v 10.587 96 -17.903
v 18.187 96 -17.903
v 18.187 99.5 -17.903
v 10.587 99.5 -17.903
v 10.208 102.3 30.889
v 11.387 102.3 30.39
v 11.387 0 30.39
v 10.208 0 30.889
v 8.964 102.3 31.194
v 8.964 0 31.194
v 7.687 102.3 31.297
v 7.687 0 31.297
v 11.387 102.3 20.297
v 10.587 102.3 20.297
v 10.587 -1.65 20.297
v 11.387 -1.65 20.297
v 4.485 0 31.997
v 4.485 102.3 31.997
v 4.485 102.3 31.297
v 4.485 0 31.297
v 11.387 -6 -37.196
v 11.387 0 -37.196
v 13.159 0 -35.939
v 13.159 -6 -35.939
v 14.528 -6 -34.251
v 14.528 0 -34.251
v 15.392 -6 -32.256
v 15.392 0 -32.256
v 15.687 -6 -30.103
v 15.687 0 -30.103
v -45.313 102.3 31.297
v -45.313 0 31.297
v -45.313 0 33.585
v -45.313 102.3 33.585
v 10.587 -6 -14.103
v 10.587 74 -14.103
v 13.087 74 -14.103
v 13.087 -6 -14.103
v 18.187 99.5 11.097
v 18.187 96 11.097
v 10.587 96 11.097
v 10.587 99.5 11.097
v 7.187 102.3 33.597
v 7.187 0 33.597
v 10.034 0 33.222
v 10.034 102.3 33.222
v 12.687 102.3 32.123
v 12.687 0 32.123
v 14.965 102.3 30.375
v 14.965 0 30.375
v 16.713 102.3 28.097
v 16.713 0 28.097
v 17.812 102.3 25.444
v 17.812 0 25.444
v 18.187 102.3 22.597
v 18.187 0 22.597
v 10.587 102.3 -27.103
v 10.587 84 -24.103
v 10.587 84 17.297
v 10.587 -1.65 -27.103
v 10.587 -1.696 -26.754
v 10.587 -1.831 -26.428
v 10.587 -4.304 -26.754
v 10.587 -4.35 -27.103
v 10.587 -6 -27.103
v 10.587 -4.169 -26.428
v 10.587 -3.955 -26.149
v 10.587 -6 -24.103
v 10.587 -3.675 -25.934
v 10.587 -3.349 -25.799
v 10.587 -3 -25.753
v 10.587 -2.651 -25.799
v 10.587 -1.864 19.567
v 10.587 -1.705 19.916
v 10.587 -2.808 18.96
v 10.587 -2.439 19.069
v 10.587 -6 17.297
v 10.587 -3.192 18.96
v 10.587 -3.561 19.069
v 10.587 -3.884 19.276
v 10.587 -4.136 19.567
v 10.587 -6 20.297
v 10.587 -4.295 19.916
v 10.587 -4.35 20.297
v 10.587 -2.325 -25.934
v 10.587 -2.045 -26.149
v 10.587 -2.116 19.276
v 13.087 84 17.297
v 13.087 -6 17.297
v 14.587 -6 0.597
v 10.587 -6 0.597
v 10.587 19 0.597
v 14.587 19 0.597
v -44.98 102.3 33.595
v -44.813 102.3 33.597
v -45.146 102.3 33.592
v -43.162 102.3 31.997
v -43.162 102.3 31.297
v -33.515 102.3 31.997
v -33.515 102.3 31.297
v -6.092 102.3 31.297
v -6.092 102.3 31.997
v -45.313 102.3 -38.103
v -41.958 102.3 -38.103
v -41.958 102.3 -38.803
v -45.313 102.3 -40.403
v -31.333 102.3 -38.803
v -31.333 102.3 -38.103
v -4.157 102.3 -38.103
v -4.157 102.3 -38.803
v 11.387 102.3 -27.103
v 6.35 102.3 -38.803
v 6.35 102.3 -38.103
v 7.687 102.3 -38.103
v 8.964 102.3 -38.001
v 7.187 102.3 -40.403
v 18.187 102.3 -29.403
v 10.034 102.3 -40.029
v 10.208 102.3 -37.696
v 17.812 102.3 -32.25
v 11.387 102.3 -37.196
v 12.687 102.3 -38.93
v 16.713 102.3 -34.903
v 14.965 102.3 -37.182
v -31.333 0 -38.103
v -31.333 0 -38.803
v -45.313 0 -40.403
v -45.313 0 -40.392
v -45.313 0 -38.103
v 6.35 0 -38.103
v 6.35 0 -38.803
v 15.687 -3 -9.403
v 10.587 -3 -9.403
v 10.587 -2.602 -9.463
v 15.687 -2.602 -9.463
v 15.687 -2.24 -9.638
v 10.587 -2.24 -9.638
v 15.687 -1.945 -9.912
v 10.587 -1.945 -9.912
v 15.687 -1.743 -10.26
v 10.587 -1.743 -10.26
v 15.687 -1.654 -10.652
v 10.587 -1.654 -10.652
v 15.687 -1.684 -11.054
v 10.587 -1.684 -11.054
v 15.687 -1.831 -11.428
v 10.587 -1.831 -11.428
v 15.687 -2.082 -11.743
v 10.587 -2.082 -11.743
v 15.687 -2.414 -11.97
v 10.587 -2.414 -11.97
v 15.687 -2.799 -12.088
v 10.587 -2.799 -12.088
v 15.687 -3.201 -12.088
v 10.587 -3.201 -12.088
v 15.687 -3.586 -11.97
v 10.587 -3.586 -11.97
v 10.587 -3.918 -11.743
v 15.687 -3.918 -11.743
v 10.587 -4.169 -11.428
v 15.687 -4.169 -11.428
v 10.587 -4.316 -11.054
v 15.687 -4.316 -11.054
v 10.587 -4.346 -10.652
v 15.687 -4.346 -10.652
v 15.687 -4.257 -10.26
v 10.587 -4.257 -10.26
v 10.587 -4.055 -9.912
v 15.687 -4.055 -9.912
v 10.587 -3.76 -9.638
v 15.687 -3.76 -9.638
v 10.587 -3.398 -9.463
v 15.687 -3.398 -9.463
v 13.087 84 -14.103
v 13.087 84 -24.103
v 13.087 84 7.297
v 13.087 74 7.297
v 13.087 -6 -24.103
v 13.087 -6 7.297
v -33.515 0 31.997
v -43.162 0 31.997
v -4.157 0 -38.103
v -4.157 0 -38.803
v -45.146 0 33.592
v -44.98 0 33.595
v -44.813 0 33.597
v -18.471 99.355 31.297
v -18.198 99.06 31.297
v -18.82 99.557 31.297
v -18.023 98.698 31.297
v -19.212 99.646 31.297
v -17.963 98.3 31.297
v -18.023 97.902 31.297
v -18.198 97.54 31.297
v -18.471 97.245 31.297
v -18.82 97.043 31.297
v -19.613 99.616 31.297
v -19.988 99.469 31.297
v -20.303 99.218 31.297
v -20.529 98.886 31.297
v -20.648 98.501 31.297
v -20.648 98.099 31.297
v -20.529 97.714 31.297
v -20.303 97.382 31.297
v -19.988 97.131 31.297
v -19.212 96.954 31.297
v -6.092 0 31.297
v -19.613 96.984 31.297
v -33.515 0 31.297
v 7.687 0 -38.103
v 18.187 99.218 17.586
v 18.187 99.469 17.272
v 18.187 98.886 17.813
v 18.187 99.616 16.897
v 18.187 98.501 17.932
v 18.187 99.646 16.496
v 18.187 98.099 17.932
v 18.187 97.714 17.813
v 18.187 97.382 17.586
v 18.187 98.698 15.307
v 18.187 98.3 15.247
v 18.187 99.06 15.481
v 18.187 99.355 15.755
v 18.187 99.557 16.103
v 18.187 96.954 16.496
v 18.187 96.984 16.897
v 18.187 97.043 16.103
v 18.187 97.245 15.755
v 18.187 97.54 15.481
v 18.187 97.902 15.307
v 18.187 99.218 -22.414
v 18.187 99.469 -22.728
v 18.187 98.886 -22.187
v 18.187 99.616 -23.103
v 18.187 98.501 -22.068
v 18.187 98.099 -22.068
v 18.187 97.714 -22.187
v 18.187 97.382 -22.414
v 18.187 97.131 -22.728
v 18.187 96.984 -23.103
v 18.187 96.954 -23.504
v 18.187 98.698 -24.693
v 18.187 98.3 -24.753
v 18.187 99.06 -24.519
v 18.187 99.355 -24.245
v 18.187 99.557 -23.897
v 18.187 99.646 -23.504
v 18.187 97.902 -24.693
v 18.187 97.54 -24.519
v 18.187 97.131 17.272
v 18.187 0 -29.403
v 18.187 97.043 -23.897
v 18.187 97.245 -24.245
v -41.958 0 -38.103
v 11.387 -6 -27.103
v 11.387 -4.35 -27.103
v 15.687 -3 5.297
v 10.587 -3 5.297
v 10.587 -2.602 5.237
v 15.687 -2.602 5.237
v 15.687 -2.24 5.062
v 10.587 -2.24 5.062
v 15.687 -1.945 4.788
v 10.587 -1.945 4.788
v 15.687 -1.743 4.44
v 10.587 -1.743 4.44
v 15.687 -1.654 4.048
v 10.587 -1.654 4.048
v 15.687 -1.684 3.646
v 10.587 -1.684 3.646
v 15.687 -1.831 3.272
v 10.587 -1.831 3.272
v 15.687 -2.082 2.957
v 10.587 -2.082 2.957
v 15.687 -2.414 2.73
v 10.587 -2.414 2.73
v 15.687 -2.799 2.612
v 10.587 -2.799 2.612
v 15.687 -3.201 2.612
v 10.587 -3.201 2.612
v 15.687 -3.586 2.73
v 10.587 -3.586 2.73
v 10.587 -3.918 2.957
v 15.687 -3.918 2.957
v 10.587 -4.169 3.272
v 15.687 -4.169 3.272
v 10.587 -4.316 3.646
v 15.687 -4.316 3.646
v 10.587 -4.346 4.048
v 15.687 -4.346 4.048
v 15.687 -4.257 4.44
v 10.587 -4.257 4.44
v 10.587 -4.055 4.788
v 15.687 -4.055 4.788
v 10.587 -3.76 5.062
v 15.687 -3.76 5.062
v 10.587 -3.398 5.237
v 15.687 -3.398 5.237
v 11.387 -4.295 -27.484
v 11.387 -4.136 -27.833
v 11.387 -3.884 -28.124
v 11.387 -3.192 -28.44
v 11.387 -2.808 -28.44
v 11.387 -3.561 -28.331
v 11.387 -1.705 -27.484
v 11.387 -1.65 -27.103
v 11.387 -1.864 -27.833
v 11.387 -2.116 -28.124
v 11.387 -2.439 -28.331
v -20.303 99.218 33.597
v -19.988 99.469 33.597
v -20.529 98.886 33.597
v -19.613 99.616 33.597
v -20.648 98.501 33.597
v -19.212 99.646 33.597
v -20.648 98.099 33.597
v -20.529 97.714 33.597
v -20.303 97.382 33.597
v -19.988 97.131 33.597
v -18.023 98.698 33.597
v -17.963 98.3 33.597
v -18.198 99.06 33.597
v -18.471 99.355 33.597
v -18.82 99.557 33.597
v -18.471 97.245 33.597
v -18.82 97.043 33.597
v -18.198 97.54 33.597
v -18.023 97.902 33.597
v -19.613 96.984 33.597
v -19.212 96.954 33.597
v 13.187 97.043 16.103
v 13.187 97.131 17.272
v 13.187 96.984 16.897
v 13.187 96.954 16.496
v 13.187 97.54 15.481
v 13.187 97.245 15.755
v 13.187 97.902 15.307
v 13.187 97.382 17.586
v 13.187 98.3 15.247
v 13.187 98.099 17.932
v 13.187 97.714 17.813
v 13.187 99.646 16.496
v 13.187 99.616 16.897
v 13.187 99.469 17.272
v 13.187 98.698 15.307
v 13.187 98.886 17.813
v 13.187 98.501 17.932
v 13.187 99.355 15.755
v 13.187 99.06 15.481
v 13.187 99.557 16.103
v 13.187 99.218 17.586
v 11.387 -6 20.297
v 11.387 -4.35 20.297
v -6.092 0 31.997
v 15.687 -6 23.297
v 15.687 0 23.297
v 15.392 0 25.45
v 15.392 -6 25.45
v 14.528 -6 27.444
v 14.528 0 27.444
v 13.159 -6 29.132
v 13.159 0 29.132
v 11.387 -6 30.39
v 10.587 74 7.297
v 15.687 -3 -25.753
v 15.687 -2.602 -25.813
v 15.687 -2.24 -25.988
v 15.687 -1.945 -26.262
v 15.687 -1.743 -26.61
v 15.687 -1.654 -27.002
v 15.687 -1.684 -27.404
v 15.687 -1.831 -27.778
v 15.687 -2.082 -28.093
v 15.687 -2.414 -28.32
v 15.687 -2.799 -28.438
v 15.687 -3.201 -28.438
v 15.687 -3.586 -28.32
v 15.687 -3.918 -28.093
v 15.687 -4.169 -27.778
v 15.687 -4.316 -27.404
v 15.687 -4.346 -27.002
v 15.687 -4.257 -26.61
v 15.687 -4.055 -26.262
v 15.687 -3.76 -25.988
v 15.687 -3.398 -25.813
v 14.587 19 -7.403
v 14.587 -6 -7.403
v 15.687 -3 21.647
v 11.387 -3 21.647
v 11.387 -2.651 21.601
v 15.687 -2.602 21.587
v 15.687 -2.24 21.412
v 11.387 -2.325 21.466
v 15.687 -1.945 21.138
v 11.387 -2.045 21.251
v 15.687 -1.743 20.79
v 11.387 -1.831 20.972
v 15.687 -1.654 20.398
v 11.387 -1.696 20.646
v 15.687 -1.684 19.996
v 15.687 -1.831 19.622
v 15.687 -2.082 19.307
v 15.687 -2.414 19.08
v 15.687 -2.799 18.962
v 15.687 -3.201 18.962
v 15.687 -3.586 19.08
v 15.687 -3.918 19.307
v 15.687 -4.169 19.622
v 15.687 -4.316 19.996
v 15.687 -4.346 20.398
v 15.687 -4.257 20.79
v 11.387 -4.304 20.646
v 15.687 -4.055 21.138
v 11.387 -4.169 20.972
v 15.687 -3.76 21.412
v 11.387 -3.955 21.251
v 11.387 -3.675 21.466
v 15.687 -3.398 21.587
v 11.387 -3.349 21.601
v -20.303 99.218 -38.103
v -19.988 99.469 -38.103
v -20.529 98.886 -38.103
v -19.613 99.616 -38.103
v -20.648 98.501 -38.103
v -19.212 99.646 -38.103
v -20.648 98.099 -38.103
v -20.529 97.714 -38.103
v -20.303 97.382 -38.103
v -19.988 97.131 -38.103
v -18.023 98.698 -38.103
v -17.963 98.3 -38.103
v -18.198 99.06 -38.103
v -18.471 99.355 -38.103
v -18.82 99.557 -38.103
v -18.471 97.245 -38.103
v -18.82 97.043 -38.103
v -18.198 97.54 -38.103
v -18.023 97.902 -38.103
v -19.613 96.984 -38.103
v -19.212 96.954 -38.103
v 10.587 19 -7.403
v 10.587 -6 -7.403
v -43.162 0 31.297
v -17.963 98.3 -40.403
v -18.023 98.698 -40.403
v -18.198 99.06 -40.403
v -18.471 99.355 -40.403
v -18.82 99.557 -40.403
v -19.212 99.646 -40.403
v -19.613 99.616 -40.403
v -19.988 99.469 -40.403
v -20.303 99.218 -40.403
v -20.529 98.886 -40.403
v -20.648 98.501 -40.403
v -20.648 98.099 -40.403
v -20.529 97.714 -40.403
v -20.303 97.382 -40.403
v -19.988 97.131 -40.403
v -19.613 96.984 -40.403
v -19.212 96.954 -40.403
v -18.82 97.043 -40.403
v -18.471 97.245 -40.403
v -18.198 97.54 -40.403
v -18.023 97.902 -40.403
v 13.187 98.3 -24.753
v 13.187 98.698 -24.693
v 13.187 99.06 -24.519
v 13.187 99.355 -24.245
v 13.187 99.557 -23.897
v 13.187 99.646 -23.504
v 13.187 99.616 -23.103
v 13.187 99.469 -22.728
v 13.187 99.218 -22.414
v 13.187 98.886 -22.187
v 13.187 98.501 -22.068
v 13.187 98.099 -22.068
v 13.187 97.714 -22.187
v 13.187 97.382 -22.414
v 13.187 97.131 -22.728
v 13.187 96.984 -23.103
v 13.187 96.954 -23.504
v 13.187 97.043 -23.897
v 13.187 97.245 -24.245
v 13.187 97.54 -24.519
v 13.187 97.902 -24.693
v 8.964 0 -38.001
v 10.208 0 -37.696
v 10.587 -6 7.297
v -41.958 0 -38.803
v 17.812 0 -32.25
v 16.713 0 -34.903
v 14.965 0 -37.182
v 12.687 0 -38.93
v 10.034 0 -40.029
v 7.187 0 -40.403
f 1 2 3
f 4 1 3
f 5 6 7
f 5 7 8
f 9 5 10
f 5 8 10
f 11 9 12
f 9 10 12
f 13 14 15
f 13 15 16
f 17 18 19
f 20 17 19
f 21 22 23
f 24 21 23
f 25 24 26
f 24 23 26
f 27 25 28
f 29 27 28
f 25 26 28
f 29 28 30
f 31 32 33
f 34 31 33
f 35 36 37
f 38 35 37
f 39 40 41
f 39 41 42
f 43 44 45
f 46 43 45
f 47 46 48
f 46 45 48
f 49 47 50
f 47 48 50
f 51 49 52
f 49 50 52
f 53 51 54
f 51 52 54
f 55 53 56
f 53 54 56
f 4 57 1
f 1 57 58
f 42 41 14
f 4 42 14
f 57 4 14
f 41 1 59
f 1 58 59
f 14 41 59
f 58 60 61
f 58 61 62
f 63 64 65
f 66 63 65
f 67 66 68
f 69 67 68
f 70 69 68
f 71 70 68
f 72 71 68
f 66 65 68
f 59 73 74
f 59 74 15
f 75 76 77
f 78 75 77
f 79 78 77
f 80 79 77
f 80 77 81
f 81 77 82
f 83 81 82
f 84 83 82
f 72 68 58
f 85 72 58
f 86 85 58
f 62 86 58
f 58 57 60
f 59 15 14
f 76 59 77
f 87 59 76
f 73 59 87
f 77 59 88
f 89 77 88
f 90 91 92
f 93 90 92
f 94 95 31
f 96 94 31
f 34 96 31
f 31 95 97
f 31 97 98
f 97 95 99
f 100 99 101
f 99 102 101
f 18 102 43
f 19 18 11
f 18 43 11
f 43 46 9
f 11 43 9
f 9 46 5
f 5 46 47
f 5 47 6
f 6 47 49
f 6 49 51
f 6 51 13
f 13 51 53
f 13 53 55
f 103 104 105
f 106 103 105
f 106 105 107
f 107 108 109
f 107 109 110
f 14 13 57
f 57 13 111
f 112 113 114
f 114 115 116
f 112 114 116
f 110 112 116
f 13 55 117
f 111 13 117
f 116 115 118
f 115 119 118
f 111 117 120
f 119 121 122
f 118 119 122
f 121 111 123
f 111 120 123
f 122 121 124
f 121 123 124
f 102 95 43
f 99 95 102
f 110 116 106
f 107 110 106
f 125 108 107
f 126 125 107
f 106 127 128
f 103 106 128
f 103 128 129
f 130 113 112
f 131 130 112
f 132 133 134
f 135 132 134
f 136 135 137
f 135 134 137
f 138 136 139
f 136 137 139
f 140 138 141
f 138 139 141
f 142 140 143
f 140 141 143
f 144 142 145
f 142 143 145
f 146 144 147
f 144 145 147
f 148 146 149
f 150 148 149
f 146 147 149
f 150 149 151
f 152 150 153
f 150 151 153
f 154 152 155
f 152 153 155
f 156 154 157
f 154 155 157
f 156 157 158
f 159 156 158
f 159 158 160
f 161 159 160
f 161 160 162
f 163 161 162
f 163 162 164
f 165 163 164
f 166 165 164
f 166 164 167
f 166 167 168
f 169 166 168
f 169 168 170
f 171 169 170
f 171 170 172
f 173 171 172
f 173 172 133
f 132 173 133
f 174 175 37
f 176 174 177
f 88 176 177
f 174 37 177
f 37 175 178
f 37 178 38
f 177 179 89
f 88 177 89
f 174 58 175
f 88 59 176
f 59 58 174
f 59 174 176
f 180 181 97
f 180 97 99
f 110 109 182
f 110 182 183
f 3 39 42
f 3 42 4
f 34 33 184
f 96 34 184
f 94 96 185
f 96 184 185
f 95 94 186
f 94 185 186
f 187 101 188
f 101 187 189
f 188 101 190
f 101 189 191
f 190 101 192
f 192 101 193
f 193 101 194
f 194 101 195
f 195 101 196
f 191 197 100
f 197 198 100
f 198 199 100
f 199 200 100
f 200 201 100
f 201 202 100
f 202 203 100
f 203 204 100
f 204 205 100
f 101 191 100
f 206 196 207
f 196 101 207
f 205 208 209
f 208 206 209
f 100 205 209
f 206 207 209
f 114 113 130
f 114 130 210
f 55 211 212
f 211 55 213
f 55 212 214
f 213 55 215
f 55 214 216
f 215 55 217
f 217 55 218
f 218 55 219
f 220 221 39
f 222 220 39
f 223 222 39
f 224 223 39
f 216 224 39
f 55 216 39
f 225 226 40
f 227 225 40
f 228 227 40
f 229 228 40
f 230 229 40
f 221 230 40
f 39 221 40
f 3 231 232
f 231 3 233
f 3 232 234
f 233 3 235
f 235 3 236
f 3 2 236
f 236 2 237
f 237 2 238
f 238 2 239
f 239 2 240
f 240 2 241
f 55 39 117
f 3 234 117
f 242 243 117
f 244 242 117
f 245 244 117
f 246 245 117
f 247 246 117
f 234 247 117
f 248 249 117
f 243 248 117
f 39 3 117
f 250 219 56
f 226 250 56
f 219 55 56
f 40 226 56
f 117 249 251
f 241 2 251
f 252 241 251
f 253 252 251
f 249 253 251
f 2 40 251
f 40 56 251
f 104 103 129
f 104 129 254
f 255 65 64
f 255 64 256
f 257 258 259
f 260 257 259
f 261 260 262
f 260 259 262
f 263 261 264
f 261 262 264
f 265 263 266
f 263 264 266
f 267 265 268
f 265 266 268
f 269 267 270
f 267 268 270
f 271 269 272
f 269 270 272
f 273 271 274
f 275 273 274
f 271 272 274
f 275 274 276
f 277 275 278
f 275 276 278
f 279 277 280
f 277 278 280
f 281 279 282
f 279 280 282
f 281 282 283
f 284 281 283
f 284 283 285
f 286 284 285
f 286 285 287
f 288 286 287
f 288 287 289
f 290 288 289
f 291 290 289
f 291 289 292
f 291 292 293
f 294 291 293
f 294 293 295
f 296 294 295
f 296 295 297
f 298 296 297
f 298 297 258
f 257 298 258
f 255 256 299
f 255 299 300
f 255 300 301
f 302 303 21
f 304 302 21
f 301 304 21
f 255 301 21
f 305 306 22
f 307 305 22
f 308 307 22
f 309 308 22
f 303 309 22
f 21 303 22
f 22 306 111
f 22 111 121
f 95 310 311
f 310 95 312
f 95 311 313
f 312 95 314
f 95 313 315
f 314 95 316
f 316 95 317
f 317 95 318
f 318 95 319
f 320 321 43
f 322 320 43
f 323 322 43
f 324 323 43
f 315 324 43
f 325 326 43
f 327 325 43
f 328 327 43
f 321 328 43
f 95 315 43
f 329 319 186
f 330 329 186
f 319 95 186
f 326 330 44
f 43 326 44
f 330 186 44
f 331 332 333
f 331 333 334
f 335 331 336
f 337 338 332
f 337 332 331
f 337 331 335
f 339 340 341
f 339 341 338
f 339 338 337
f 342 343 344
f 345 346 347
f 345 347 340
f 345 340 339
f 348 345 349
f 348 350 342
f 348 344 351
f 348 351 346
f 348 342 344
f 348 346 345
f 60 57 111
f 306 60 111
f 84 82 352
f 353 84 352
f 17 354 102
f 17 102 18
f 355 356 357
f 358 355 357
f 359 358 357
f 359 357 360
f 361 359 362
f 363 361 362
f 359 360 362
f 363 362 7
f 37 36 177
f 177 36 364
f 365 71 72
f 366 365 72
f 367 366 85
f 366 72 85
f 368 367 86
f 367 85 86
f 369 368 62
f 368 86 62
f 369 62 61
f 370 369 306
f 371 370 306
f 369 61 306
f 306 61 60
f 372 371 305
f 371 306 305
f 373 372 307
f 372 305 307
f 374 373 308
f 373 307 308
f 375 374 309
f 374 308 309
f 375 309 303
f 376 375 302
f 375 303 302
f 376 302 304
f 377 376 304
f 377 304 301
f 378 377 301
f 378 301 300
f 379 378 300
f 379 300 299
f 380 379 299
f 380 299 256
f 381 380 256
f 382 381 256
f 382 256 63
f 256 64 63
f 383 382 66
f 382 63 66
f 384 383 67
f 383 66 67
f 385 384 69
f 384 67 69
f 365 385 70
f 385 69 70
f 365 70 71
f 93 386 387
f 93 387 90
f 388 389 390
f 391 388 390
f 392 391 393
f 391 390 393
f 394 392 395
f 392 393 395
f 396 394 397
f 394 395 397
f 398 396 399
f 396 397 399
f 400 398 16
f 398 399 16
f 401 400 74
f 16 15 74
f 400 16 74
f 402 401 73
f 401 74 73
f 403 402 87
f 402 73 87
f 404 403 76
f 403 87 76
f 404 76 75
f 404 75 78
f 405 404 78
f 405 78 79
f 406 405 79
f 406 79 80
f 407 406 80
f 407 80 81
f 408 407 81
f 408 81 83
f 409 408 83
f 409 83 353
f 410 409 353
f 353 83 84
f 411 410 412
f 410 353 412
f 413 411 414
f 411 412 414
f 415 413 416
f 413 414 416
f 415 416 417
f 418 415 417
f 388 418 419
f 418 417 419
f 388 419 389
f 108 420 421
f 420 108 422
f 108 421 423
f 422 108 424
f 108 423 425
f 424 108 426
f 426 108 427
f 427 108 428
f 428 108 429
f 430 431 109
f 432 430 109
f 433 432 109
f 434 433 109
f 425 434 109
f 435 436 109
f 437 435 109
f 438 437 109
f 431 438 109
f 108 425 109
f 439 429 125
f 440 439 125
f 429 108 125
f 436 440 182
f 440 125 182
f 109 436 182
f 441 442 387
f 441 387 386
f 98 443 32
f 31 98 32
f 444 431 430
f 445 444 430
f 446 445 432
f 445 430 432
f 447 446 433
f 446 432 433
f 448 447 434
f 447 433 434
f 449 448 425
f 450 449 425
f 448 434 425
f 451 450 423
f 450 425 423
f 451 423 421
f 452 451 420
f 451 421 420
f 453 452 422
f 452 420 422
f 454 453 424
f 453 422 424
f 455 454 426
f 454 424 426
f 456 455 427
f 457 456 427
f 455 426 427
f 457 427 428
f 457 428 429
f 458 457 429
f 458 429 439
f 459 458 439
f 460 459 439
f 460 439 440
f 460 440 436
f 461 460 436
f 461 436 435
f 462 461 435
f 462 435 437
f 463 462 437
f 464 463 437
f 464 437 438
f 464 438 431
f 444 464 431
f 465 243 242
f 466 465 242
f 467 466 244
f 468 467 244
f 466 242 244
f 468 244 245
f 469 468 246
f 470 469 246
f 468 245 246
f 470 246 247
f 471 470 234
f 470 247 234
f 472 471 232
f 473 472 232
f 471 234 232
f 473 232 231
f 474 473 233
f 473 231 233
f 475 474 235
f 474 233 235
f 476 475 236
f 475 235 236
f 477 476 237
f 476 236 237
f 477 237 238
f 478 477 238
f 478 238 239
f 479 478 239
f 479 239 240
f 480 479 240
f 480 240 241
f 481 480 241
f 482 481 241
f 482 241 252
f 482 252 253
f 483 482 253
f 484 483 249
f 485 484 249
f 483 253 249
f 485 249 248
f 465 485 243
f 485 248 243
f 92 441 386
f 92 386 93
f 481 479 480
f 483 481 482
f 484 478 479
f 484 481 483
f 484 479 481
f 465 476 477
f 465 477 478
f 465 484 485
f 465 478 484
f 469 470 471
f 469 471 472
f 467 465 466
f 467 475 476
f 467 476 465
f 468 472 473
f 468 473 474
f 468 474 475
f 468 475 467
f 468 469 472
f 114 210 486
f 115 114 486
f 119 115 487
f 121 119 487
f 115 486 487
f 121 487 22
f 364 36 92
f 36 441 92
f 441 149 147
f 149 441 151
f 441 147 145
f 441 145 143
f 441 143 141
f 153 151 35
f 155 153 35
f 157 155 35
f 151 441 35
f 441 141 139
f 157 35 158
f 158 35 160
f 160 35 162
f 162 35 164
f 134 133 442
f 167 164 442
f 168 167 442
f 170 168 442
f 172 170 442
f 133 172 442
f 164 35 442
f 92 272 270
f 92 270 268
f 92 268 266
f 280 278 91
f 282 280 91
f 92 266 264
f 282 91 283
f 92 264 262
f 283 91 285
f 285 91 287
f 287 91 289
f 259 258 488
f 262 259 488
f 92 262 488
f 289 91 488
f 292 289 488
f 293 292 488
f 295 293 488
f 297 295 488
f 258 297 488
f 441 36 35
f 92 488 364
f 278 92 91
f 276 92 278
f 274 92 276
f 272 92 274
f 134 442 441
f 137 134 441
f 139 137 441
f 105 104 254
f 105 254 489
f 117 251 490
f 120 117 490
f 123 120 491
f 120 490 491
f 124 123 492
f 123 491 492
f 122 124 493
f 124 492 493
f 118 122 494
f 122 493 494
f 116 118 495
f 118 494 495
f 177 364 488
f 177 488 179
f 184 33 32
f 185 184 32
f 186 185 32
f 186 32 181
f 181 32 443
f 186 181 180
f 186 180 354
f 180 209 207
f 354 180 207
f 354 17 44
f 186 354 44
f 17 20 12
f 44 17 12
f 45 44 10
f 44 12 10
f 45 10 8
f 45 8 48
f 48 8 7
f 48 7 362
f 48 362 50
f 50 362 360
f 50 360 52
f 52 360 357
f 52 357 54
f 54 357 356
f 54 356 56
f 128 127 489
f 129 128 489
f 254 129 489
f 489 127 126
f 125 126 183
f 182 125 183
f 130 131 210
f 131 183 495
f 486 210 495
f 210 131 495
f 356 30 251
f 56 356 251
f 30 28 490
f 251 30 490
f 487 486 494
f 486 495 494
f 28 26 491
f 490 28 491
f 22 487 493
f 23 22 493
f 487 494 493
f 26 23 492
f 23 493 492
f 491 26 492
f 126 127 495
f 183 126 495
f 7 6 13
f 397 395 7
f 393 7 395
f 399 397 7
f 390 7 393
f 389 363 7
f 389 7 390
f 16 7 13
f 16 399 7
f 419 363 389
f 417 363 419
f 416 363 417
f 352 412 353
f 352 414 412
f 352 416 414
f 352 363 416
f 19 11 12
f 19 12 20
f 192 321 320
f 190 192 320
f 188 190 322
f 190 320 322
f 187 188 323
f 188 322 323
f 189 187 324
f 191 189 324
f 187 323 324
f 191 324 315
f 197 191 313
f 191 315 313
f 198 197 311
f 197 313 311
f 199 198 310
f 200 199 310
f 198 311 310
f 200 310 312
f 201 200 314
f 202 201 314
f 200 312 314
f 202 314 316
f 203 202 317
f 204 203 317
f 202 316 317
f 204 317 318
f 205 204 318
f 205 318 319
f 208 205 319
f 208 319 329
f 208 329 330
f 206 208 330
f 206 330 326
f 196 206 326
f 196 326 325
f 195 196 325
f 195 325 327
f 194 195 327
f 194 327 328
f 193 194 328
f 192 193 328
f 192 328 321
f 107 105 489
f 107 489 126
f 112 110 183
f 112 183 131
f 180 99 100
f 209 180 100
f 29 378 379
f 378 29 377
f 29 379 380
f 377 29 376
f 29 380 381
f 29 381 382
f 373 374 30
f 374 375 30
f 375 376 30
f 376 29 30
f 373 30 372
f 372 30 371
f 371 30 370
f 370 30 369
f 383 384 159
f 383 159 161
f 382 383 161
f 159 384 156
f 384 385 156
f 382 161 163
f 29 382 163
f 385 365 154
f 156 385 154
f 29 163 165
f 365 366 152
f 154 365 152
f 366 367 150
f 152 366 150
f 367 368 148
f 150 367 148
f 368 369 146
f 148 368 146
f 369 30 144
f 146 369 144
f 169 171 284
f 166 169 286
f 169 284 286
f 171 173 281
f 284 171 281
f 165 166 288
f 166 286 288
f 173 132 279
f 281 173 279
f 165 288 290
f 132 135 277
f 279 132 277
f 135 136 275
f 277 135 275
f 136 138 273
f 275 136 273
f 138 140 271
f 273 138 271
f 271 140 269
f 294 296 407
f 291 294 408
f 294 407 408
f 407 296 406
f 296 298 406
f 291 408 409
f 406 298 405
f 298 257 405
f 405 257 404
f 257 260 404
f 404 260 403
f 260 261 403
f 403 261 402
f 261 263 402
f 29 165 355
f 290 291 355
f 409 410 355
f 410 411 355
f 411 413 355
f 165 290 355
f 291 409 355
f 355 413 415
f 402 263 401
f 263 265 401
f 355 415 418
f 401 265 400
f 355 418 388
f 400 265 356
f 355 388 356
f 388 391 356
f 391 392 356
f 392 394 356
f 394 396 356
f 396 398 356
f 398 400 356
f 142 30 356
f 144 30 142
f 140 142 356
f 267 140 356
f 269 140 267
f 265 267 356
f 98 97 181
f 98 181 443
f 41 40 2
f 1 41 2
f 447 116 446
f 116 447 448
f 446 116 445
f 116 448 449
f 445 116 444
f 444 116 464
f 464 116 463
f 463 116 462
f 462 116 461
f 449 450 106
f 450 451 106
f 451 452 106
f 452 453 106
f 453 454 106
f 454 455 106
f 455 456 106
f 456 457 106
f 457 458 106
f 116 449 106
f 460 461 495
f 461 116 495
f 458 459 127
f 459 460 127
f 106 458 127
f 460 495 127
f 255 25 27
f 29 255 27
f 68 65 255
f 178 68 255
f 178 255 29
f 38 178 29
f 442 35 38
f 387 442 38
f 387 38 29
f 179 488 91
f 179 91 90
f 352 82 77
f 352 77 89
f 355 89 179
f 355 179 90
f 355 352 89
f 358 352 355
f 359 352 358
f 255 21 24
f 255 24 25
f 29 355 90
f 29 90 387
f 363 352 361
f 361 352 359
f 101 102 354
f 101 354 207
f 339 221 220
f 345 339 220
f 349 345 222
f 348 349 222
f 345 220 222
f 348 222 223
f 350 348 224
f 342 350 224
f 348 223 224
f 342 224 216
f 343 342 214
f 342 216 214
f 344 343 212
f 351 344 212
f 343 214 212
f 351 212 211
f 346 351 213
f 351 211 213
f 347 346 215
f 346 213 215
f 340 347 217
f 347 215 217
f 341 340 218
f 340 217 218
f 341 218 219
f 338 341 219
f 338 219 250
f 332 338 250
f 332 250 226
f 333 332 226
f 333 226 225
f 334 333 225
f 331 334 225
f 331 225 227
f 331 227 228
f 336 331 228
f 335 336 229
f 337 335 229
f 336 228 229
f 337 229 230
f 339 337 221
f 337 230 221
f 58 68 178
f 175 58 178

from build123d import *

# Parameters (mm, degrees)
BOSS_EXTRUDE1_DEPTH = 120
BOSS_EXTRUDE2_DEPTH = 120
SKETCH4_W           = 0.8
SKETCH4_H           = 47.4
BOSS_EXTRUDE3_DEPTH = 120
BOSS_EXTRUDE4_DEPTH = 6
SKETCH6_W           = 3.197214061
SKETCH6_H           = 10
SKETCH6_W_2         = 2.544721395
CUT_EXTRUDE1_DEPTH  = 90
SKETCH7_W           = 18.489641695
SKETCH7_H           = 120.194280457
CUT_EXTRUDE2_DEPTH  = 140
SKETCH9_W           = 8
SKETCH9_H           = 33.33003075
CUT_EXTRUDE3_DEPTH  = 4
SKETCH10_R          = 1.35
CUT_EXTRUDE4_DEPTH  = 11
SKETCH11_R          = 1.35
CUT_EXTRUDE5_DEPTH  = 11
SKETCH12_W          = 29
SKETCH12_H          = 3.5
CUT_EXTRUDE6_DEPTH  = 10
SKETCH13_W          = 93.224255338
SKETCH13_H          = 23.971951373
CUT_EXTRUDE7_DEPTH  = 103
SKETCH14_W          = 38.705642401
SKETCH14_H          = 10
CUT_EXTRUDE8_DEPTH  = 2.5
SKETCH15_R          = 1.35
CUT_EXTRUDE9_DEPTH  = 5
SKETCH16_R          = 1.35
CUT_EXTRUDE10_DEPTH = 88
SKETCH17_W          = 10.62518409
SKETCH17_H          = 1.204079054
SKETCH17_W_2        = 10.507821767
SKETCH17_W_3        = 9.64704318
SKETCH17_H_2        = 1.005507522
SKETCH17_W_4        = 10.576043604
SKETCH17_H_3        = 1.445279271
CUT_EXTRUDE11_DEPTH = 200


with BuildPart() as part:
    # Sketch1 → Boss-Extrude1 (new body)
    with BuildSketch(Plane(origin=(0, 0, 0), x_dir=(1, 0, 0), z_dir=(0, 1, 0))):
        with BuildLine():
            Line((-55.813088795, 29.403372847), (-55.813088795, -22.596627153))
            ThreePointArc((-55.813088795, -22.596627153), (-52.766075655, -30.195969229), (-45.313088795, -33.585257641))
            Line((-45.313088795, -33.585257641), (-45.313088795, -31.296627153))
            ThreePointArc((-45.313088795, -31.296627153), (-50.969943044, -28.953481402), (-53.313088795, -23.296627153))
            Line((-53.313088795, -23.296627153), (-53.313088795, 30.103372847))
            ThreePointArc((-53.313088795, 30.103372847), (-50.969943044, 35.760227097), (-45.313088795, 38.103372847))
            Line((-45.313088795, 38.103372847), (-45.313088795, 40.392003335))
            ThreePointArc((-45.313088795, 40.392003335), (-52.766075655, 37.002714924), (-55.813088795, 29.403372847))
        make_face()
        with BuildLine():
            Line((-45.313088795, -31.296627153), (-45.313088795, -33.585257641))
            ThreePointArc((-45.313088795, -33.585257641), (-45.063153419, -33.593784407), (-44.813088795, -33.596627153))
            Line((-44.813088795, -33.596627153), (7.186911205, -33.596627153))
            ThreePointArc((7.186911205, -33.596627153), (14.965085798, -30.374801746), (18.186911205, -22.596627153))
            Line((18.186911205, -22.596627153), (18.186911205, 29.403372847))
            ThreePointArc((18.186911205, 29.403372847), (14.965085798, 37.18154744), (7.186911205, 40.403372847))
            Line((7.186911205, 40.403372847), (-45.313088795, 40.403372847))
            Line((-45.313088795, 40.403372847), (-45.313088795, 40.392003335))
            Line((-45.313088795, 40.392003335), (-45.313088795, 38.103372847))
            Line((-45.313088795, 38.103372847), (7.686911205, 38.103372847))
            ThreePointArc((7.686911205, 38.103372847), (13.343765455, 35.760227097), (15.686911205, 30.103372847))
            Line((15.686911205, 30.103372847), (15.686911205, -23.296627153))
            ThreePointArc((15.686911205, -23.296627153), (13.343765455, -28.953481402), (7.686911205, -31.296627153))
            Line((7.686911205, -31.296627153), (-45.313088795, -31.296627153))
        make_face()
    extrude(amount=BOSS_EXTRUDE1_DEPTH)

    # Sketch3 → Boss-Extrude2 (add)
    with BuildSketch(Plane.XZ):
        Polygon((-49.013088795, 31.972735522), (-49.013088795, -37.623215713), (-53.336517426, -34.913867104), (-55.11106611, -29.984565206), (-55.11106611, -26.811210851), (-55.11106611, 25.452378342), (-53.652842224, 27.779331351), (-52.073193111, 30.226675048), align=None)
        Polygon((11.386911205, 31.972735522), (11.386911205, -38.487790626), (13.269736219, -37.809973621), (16.737085445, -32.276969537), (16.568342629, -31.170966754), (16.568342629, 24.789777041), (15.03852436, 28.997230807), align=None)
    extrude(amount=-BOSS_EXTRUDE2_DEPTH)

    # Sketch4 → Boss-Extrude3 (add)
    with BuildSketch(Plane.XZ):
        with Locations((10.986911205, -3.403372847)):
            Rectangle(SKETCH4_W, SKETCH4_H)
        with Locations((-48.613088795, -3.403372847)):
            Rectangle(SKETCH4_W, SKETCH4_H)
    extrude(amount=-BOSS_EXTRUDE3_DEPTH)

    # Sketch5 → Boss-Extrude4 (add)
    with BuildSketch(Plane.XZ):
        with BuildLine():
            ThreePointArc((-49.013088795, 30.389581403), (-52.154141346, 27.443915423), (-53.313088795, 23.296627153))
            Line((-53.313088795, 23.296627153), (-53.313088795, -30.103372847))
            ThreePointArc((-53.313088795, -30.103372847), (-52.154141346, -34.250661118), (-49.013088795, -37.196327098))
            Line((-49.013088795, -37.196327098), (-49.013088795, -27.103372847))
            Line((-49.013088795, -27.103372847), (-48.213088795, -27.103372847))
            Line((-48.213088795, -27.103372847), (-48.213088795, 20.296627153))
            Line((-48.213088795, 20.296627153), (-49.013088795, 20.296627153))
            Line((-49.013088795, 20.296627153), (-49.013088795, 30.389581403))
        make_face()
        with BuildLine():
            ThreePointArc((11.386911205, -37.196327098), (14.527963756, -34.250661118), (15.686911205, -30.103372847))
            Line((15.686911205, -30.103372847), (15.686911205, 23.296627153))
            ThreePointArc((15.686911205, 23.296627153), (14.527963756, 27.443915423), (11.386911205, 30.389581403))
            Line((11.386911205, 30.389581403), (11.386911205, 20.296627153))
            Line((11.386911205, 20.296627153), (10.586911205, 20.296627153))
            Line((10.586911205, 20.296627153), (10.586911205, -27.103372847))
            Line((10.586911205, -27.103372847), (11.386911205, -27.103372847))
            Line((11.386911205, -27.103372847), (11.386911205, -37.196327098))
        make_face()
    extrude(amount=BOSS_EXTRUDE4_DEPTH)

    # Sketch6 → Cut-Extrude1 (cut)
    with BuildSketch(Plane.XZ.offset(6)):
        with Locations((-49.114481764, 12.296627153)):
            Rectangle(SKETCH6_W, SKETCH6_H)
        with Locations((-49.440728097, -19.103372847)):
            Rectangle(SKETCH6_W_2, SKETCH6_H)
        with Locations((11.814550508, -19.103372847)):
            Rectangle(SKETCH6_W_2, SKETCH6_H)
        with Locations((11.488304175, 12.296627153)):
            Rectangle(SKETCH6_W, SKETCH6_H)
    extrude(amount=-CUT_EXTRUDE1_DEPTH, mode=Mode.SUBTRACT)

    # Sketch7 → Cut-Extrude2 (cut)
    with BuildSketch(Plane.XZ.offset(6)):
        with Locations((-54.557909643, -9.755963426)):
            Rectangle(SKETCH7_W, SKETCH7_H)
    extrude(amount=-CUT_EXTRUDE2_DEPTH, mode=Mode.SUBTRACT)

    # Sketch9 → Cut-Extrude3 (cut)
    with BuildSketch(Plane.ZY.offset(-10.586911205)):
        with Locations((-3.403372847, 2.334984625)):
            Rectangle(SKETCH9_W, SKETCH9_H)
    extrude(amount=-CUT_EXTRUDE3_DEPTH, mode=Mode.SUBTRACT)

    # Sketch10 → Cut-Extrude4 (cut)
    with BuildSketch(Plane.ZY.offset(-10.586911205)):
        with Locations((-10.753372847, -3)):
            Circle(SKETCH10_R)
        with Locations((3.946627153, -3)):
            Circle(SKETCH10_R)
    extrude(amount=-CUT_EXTRUDE4_DEPTH, mode=Mode.SUBTRACT)

    # Sketch11 → Cut-Extrude5 (cut)
    with BuildSketch(Plane.ZY.offset(-10.586911205)):
        with Locations((20.296627153, -3)):
            Circle(SKETCH11_R)
        with Locations((-27.103372847, -3)):
            Circle(SKETCH11_R)
    extrude(amount=-CUT_EXTRUDE5_DEPTH, mode=Mode.SUBTRACT)

    # Sketch12 → Cut-Extrude6 (cut)
    with BuildSketch(Plane(origin=(18.186911205, 0, 0), x_dir=(0, 0, -1), z_dir=(1, 0, 0))):
        with Locations((3.403372847, 97.75)):
            Rectangle(SKETCH12_W, SKETCH12_H)
    extrude(amount=-CUT_EXTRUDE6_DEPTH, mode=Mode.SUBTRACT)

    # Sketch13 → Cut-Extrude7 (cut)
    with BuildSketch(Plane(origin=(18.186911205, 0, 0), x_dir=(0, 0, -1), z_dir=(1, 0, 0))):
        with Locations((2.372000063, 114.285975687)):
            Rectangle(SKETCH13_W, SKETCH13_H)
    extrude(amount=-CUT_EXTRUDE7_DEPTH, mode=Mode.SUBTRACT)

    # Sketch14 → Cut-Extrude8 (cut)
    with BuildSketch(Plane.ZY.offset(-10.586911205)):
        with Locations((-2.056194048, 79)):
            Rectangle(SKETCH14_W, SKETCH14_H)
    extrude(amount=-CUT_EXTRUDE8_DEPTH, mode=Mode.SUBTRACT)

    # Sketch15 → Cut-Extrude9 (cut)
    with BuildSketch(Plane(origin=(18.186911205, 0, 0), x_dir=(0, 0, -1), z_dir=(1, 0, 0))):
        with Locations((23.403372847, 98.3)):
            Circle(SKETCH15_R)
        with Locations((-16.596627153, 98.3)):
            Circle(SKETCH15_R)
    extrude(amount=-CUT_EXTRUDE9_DEPTH, mode=Mode.SUBTRACT)

    # Sketch16 → Cut-Extrude10 (cut)
    with BuildSketch(Plane.XY.offset(33.596627153)):
        with Locations((-19.313088795, 98.3)):
            Circle(SKETCH16_R)
    extrude(amount=-CUT_EXTRUDE10_DEPTH, mode=Mode.SUBTRACT)

    # Sketch17 → Cut-Extrude11 (cut)
    with BuildSketch(Plane(origin=(0, 102.3, 0), x_dir=(1, 0, 0), z_dir=(0, 1, 0))):
        with Locations((-36.645164777, 38.20133332)):
            Rectangle(SKETCH17_W, SKETCH17_H)
        with Locations((1.096553781, 38.20133332)):
            Rectangle(SKETCH17_W_2, SKETCH17_H)
        with Locations((-38.338294946, -31.493873392)):
            Rectangle(SKETCH17_W_3, SKETCH17_H_2)
        with Locations((-0.803500168, -31.273987518)):
            Rectangle(SKETCH17_W_4, SKETCH17_H_3)
    extrude(amount=-CUT_EXTRUDE11_DEPTH, mode=Mode.SUBTRACT)


solid = part.part
